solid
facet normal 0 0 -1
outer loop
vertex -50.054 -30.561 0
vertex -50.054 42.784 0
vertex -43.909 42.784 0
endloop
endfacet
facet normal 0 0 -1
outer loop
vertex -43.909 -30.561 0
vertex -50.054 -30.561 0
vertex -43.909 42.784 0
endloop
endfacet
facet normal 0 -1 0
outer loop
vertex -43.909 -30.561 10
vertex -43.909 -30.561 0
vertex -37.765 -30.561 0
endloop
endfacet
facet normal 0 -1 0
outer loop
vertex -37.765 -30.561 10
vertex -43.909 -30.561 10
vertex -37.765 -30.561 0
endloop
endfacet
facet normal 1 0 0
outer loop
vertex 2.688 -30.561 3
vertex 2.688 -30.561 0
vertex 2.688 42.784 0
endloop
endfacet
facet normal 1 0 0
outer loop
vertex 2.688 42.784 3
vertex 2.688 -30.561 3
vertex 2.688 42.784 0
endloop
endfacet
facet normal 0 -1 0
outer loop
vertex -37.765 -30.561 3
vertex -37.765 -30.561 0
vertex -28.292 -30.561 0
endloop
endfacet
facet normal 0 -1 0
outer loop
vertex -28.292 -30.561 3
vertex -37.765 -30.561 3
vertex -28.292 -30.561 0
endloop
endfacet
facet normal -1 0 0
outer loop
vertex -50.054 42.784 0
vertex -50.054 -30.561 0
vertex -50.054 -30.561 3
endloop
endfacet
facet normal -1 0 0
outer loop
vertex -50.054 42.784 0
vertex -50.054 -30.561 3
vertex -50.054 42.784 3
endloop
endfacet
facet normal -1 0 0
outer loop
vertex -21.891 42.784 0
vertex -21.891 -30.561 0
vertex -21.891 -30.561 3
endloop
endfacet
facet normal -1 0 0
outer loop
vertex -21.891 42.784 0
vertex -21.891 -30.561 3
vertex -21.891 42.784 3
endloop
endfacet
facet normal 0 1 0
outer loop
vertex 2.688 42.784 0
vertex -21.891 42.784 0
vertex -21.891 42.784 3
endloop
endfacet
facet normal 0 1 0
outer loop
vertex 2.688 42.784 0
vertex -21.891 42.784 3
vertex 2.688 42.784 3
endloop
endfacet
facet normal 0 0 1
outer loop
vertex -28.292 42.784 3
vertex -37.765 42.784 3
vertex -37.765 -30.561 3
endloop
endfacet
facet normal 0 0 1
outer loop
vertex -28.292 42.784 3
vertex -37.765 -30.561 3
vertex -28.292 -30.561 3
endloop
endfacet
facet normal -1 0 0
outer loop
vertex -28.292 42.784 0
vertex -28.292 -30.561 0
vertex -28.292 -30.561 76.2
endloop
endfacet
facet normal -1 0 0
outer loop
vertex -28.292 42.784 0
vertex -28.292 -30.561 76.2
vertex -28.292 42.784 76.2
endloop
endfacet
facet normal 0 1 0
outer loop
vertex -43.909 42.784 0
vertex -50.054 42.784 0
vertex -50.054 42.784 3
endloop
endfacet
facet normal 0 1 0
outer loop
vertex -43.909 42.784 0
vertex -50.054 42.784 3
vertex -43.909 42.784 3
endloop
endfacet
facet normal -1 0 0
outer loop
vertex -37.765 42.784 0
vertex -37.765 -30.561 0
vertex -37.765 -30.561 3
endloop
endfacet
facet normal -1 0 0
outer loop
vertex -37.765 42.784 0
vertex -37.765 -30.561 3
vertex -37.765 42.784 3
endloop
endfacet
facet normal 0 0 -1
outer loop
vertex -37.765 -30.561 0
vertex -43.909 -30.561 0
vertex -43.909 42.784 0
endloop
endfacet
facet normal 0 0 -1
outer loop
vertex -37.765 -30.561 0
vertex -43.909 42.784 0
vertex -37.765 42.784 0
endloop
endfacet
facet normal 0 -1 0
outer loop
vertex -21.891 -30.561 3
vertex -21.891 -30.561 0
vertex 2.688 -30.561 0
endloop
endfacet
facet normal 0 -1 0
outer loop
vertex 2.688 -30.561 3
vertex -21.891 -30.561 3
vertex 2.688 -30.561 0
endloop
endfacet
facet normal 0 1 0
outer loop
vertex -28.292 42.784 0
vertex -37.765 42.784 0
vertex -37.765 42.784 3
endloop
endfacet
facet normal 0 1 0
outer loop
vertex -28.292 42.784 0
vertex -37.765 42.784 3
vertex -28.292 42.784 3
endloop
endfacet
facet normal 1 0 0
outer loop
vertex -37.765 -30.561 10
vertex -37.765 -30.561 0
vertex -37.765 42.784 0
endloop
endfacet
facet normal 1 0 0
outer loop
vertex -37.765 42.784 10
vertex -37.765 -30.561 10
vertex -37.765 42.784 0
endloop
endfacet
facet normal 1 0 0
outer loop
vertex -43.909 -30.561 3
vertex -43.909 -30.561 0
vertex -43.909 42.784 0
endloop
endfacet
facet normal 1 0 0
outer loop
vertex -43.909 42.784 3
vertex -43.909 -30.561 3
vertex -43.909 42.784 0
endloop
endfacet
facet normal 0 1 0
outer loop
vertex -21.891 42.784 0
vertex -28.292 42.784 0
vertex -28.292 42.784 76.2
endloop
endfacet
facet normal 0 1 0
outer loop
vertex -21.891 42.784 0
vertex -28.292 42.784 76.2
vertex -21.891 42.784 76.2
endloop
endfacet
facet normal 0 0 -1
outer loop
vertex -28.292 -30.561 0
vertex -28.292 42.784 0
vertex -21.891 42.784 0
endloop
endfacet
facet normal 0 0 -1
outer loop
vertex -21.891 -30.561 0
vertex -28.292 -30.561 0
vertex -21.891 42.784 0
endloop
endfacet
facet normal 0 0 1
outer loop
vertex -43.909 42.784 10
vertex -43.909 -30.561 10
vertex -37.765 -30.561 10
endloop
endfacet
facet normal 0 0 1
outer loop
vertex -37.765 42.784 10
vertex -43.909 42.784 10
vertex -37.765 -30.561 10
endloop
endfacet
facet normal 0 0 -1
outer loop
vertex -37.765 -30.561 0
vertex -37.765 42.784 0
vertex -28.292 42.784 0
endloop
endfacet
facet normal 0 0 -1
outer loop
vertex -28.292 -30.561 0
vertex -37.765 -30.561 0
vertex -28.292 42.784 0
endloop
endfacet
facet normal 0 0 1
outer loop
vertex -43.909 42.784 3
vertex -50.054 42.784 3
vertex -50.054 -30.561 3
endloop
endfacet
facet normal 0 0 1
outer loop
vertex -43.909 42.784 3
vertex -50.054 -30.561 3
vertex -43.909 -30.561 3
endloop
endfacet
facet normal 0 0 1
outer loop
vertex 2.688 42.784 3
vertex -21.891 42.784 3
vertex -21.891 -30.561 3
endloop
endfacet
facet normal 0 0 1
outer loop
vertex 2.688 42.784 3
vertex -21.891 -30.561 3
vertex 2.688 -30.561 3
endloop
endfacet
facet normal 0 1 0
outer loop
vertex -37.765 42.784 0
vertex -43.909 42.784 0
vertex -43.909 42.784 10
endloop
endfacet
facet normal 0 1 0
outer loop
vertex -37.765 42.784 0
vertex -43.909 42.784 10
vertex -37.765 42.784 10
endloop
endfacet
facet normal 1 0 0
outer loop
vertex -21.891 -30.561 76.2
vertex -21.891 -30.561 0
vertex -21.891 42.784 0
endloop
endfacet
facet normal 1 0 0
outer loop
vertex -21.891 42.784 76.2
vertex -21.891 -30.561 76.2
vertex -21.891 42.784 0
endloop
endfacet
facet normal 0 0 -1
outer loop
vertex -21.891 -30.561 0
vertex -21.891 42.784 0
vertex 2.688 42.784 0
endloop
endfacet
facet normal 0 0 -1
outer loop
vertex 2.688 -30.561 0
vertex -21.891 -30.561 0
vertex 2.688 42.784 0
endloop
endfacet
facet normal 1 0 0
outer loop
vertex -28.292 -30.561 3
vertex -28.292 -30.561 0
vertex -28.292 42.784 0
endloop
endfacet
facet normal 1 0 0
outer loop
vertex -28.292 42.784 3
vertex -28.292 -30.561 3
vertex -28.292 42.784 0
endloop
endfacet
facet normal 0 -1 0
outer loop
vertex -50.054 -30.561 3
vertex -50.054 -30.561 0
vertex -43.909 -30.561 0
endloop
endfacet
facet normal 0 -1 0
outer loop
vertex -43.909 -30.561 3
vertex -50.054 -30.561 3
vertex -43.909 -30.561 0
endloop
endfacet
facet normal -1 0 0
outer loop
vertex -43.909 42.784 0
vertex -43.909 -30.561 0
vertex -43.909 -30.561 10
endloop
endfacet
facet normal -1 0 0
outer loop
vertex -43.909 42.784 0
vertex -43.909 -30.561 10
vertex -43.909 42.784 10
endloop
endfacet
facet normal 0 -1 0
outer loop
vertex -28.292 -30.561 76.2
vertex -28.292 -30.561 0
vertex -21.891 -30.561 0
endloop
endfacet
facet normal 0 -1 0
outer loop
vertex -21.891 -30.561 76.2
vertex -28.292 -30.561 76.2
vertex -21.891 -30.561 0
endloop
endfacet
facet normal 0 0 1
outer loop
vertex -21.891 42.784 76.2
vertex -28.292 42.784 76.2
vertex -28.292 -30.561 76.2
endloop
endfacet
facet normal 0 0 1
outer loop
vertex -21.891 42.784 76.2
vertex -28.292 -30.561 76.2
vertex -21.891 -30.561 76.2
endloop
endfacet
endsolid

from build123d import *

# Parameters (mm, degrees)
F0_W     = 24.579069
F0_H     = 73.345329
F0_W_2   = 9.473185
F0_W_3   = 6.144766
F1_DEPTH = 3
F0_W_4   = 6.144769
F2_DEPTH = 10
F0_W_5   = 6.400801
F3_DEPTH = 76.2


with BuildPart() as f1:
    # F0 (on Top) → F1 (new body)
    with BuildSketch(Plane.XY):
        with Locations((-9.6012, 6.111802)):
            Rectangle(F0_W, F0_H)
        with Locations((-33.028129, 6.111802)):
            Rectangle(F0_W_2, F0_H)
        with Locations((-46.981873, 6.111802)):
            Rectangle(F0_W_3, F0_H)
    extrude(amount=F1_DEPTH)


with BuildPart() as f2:
    # F0 (on Top) → F2 (new body)
    with BuildSketch(Plane.XY):
        with Locations((-40.837105, 6.111802)):
            Rectangle(F0_W_4, F0_H)
    extrude(amount=F2_DEPTH)


with BuildPart() as f3:
    # F0 (on Top) → F3 (new body)
    with BuildSketch(Plane.XY):
        with Locations((-25.091136, 6.111802)):
            Rectangle(F0_W_5, F0_H)
    extrude(amount=F3_DEPTH)


solid = Compound([f1.part, f2.part, f3.part])
